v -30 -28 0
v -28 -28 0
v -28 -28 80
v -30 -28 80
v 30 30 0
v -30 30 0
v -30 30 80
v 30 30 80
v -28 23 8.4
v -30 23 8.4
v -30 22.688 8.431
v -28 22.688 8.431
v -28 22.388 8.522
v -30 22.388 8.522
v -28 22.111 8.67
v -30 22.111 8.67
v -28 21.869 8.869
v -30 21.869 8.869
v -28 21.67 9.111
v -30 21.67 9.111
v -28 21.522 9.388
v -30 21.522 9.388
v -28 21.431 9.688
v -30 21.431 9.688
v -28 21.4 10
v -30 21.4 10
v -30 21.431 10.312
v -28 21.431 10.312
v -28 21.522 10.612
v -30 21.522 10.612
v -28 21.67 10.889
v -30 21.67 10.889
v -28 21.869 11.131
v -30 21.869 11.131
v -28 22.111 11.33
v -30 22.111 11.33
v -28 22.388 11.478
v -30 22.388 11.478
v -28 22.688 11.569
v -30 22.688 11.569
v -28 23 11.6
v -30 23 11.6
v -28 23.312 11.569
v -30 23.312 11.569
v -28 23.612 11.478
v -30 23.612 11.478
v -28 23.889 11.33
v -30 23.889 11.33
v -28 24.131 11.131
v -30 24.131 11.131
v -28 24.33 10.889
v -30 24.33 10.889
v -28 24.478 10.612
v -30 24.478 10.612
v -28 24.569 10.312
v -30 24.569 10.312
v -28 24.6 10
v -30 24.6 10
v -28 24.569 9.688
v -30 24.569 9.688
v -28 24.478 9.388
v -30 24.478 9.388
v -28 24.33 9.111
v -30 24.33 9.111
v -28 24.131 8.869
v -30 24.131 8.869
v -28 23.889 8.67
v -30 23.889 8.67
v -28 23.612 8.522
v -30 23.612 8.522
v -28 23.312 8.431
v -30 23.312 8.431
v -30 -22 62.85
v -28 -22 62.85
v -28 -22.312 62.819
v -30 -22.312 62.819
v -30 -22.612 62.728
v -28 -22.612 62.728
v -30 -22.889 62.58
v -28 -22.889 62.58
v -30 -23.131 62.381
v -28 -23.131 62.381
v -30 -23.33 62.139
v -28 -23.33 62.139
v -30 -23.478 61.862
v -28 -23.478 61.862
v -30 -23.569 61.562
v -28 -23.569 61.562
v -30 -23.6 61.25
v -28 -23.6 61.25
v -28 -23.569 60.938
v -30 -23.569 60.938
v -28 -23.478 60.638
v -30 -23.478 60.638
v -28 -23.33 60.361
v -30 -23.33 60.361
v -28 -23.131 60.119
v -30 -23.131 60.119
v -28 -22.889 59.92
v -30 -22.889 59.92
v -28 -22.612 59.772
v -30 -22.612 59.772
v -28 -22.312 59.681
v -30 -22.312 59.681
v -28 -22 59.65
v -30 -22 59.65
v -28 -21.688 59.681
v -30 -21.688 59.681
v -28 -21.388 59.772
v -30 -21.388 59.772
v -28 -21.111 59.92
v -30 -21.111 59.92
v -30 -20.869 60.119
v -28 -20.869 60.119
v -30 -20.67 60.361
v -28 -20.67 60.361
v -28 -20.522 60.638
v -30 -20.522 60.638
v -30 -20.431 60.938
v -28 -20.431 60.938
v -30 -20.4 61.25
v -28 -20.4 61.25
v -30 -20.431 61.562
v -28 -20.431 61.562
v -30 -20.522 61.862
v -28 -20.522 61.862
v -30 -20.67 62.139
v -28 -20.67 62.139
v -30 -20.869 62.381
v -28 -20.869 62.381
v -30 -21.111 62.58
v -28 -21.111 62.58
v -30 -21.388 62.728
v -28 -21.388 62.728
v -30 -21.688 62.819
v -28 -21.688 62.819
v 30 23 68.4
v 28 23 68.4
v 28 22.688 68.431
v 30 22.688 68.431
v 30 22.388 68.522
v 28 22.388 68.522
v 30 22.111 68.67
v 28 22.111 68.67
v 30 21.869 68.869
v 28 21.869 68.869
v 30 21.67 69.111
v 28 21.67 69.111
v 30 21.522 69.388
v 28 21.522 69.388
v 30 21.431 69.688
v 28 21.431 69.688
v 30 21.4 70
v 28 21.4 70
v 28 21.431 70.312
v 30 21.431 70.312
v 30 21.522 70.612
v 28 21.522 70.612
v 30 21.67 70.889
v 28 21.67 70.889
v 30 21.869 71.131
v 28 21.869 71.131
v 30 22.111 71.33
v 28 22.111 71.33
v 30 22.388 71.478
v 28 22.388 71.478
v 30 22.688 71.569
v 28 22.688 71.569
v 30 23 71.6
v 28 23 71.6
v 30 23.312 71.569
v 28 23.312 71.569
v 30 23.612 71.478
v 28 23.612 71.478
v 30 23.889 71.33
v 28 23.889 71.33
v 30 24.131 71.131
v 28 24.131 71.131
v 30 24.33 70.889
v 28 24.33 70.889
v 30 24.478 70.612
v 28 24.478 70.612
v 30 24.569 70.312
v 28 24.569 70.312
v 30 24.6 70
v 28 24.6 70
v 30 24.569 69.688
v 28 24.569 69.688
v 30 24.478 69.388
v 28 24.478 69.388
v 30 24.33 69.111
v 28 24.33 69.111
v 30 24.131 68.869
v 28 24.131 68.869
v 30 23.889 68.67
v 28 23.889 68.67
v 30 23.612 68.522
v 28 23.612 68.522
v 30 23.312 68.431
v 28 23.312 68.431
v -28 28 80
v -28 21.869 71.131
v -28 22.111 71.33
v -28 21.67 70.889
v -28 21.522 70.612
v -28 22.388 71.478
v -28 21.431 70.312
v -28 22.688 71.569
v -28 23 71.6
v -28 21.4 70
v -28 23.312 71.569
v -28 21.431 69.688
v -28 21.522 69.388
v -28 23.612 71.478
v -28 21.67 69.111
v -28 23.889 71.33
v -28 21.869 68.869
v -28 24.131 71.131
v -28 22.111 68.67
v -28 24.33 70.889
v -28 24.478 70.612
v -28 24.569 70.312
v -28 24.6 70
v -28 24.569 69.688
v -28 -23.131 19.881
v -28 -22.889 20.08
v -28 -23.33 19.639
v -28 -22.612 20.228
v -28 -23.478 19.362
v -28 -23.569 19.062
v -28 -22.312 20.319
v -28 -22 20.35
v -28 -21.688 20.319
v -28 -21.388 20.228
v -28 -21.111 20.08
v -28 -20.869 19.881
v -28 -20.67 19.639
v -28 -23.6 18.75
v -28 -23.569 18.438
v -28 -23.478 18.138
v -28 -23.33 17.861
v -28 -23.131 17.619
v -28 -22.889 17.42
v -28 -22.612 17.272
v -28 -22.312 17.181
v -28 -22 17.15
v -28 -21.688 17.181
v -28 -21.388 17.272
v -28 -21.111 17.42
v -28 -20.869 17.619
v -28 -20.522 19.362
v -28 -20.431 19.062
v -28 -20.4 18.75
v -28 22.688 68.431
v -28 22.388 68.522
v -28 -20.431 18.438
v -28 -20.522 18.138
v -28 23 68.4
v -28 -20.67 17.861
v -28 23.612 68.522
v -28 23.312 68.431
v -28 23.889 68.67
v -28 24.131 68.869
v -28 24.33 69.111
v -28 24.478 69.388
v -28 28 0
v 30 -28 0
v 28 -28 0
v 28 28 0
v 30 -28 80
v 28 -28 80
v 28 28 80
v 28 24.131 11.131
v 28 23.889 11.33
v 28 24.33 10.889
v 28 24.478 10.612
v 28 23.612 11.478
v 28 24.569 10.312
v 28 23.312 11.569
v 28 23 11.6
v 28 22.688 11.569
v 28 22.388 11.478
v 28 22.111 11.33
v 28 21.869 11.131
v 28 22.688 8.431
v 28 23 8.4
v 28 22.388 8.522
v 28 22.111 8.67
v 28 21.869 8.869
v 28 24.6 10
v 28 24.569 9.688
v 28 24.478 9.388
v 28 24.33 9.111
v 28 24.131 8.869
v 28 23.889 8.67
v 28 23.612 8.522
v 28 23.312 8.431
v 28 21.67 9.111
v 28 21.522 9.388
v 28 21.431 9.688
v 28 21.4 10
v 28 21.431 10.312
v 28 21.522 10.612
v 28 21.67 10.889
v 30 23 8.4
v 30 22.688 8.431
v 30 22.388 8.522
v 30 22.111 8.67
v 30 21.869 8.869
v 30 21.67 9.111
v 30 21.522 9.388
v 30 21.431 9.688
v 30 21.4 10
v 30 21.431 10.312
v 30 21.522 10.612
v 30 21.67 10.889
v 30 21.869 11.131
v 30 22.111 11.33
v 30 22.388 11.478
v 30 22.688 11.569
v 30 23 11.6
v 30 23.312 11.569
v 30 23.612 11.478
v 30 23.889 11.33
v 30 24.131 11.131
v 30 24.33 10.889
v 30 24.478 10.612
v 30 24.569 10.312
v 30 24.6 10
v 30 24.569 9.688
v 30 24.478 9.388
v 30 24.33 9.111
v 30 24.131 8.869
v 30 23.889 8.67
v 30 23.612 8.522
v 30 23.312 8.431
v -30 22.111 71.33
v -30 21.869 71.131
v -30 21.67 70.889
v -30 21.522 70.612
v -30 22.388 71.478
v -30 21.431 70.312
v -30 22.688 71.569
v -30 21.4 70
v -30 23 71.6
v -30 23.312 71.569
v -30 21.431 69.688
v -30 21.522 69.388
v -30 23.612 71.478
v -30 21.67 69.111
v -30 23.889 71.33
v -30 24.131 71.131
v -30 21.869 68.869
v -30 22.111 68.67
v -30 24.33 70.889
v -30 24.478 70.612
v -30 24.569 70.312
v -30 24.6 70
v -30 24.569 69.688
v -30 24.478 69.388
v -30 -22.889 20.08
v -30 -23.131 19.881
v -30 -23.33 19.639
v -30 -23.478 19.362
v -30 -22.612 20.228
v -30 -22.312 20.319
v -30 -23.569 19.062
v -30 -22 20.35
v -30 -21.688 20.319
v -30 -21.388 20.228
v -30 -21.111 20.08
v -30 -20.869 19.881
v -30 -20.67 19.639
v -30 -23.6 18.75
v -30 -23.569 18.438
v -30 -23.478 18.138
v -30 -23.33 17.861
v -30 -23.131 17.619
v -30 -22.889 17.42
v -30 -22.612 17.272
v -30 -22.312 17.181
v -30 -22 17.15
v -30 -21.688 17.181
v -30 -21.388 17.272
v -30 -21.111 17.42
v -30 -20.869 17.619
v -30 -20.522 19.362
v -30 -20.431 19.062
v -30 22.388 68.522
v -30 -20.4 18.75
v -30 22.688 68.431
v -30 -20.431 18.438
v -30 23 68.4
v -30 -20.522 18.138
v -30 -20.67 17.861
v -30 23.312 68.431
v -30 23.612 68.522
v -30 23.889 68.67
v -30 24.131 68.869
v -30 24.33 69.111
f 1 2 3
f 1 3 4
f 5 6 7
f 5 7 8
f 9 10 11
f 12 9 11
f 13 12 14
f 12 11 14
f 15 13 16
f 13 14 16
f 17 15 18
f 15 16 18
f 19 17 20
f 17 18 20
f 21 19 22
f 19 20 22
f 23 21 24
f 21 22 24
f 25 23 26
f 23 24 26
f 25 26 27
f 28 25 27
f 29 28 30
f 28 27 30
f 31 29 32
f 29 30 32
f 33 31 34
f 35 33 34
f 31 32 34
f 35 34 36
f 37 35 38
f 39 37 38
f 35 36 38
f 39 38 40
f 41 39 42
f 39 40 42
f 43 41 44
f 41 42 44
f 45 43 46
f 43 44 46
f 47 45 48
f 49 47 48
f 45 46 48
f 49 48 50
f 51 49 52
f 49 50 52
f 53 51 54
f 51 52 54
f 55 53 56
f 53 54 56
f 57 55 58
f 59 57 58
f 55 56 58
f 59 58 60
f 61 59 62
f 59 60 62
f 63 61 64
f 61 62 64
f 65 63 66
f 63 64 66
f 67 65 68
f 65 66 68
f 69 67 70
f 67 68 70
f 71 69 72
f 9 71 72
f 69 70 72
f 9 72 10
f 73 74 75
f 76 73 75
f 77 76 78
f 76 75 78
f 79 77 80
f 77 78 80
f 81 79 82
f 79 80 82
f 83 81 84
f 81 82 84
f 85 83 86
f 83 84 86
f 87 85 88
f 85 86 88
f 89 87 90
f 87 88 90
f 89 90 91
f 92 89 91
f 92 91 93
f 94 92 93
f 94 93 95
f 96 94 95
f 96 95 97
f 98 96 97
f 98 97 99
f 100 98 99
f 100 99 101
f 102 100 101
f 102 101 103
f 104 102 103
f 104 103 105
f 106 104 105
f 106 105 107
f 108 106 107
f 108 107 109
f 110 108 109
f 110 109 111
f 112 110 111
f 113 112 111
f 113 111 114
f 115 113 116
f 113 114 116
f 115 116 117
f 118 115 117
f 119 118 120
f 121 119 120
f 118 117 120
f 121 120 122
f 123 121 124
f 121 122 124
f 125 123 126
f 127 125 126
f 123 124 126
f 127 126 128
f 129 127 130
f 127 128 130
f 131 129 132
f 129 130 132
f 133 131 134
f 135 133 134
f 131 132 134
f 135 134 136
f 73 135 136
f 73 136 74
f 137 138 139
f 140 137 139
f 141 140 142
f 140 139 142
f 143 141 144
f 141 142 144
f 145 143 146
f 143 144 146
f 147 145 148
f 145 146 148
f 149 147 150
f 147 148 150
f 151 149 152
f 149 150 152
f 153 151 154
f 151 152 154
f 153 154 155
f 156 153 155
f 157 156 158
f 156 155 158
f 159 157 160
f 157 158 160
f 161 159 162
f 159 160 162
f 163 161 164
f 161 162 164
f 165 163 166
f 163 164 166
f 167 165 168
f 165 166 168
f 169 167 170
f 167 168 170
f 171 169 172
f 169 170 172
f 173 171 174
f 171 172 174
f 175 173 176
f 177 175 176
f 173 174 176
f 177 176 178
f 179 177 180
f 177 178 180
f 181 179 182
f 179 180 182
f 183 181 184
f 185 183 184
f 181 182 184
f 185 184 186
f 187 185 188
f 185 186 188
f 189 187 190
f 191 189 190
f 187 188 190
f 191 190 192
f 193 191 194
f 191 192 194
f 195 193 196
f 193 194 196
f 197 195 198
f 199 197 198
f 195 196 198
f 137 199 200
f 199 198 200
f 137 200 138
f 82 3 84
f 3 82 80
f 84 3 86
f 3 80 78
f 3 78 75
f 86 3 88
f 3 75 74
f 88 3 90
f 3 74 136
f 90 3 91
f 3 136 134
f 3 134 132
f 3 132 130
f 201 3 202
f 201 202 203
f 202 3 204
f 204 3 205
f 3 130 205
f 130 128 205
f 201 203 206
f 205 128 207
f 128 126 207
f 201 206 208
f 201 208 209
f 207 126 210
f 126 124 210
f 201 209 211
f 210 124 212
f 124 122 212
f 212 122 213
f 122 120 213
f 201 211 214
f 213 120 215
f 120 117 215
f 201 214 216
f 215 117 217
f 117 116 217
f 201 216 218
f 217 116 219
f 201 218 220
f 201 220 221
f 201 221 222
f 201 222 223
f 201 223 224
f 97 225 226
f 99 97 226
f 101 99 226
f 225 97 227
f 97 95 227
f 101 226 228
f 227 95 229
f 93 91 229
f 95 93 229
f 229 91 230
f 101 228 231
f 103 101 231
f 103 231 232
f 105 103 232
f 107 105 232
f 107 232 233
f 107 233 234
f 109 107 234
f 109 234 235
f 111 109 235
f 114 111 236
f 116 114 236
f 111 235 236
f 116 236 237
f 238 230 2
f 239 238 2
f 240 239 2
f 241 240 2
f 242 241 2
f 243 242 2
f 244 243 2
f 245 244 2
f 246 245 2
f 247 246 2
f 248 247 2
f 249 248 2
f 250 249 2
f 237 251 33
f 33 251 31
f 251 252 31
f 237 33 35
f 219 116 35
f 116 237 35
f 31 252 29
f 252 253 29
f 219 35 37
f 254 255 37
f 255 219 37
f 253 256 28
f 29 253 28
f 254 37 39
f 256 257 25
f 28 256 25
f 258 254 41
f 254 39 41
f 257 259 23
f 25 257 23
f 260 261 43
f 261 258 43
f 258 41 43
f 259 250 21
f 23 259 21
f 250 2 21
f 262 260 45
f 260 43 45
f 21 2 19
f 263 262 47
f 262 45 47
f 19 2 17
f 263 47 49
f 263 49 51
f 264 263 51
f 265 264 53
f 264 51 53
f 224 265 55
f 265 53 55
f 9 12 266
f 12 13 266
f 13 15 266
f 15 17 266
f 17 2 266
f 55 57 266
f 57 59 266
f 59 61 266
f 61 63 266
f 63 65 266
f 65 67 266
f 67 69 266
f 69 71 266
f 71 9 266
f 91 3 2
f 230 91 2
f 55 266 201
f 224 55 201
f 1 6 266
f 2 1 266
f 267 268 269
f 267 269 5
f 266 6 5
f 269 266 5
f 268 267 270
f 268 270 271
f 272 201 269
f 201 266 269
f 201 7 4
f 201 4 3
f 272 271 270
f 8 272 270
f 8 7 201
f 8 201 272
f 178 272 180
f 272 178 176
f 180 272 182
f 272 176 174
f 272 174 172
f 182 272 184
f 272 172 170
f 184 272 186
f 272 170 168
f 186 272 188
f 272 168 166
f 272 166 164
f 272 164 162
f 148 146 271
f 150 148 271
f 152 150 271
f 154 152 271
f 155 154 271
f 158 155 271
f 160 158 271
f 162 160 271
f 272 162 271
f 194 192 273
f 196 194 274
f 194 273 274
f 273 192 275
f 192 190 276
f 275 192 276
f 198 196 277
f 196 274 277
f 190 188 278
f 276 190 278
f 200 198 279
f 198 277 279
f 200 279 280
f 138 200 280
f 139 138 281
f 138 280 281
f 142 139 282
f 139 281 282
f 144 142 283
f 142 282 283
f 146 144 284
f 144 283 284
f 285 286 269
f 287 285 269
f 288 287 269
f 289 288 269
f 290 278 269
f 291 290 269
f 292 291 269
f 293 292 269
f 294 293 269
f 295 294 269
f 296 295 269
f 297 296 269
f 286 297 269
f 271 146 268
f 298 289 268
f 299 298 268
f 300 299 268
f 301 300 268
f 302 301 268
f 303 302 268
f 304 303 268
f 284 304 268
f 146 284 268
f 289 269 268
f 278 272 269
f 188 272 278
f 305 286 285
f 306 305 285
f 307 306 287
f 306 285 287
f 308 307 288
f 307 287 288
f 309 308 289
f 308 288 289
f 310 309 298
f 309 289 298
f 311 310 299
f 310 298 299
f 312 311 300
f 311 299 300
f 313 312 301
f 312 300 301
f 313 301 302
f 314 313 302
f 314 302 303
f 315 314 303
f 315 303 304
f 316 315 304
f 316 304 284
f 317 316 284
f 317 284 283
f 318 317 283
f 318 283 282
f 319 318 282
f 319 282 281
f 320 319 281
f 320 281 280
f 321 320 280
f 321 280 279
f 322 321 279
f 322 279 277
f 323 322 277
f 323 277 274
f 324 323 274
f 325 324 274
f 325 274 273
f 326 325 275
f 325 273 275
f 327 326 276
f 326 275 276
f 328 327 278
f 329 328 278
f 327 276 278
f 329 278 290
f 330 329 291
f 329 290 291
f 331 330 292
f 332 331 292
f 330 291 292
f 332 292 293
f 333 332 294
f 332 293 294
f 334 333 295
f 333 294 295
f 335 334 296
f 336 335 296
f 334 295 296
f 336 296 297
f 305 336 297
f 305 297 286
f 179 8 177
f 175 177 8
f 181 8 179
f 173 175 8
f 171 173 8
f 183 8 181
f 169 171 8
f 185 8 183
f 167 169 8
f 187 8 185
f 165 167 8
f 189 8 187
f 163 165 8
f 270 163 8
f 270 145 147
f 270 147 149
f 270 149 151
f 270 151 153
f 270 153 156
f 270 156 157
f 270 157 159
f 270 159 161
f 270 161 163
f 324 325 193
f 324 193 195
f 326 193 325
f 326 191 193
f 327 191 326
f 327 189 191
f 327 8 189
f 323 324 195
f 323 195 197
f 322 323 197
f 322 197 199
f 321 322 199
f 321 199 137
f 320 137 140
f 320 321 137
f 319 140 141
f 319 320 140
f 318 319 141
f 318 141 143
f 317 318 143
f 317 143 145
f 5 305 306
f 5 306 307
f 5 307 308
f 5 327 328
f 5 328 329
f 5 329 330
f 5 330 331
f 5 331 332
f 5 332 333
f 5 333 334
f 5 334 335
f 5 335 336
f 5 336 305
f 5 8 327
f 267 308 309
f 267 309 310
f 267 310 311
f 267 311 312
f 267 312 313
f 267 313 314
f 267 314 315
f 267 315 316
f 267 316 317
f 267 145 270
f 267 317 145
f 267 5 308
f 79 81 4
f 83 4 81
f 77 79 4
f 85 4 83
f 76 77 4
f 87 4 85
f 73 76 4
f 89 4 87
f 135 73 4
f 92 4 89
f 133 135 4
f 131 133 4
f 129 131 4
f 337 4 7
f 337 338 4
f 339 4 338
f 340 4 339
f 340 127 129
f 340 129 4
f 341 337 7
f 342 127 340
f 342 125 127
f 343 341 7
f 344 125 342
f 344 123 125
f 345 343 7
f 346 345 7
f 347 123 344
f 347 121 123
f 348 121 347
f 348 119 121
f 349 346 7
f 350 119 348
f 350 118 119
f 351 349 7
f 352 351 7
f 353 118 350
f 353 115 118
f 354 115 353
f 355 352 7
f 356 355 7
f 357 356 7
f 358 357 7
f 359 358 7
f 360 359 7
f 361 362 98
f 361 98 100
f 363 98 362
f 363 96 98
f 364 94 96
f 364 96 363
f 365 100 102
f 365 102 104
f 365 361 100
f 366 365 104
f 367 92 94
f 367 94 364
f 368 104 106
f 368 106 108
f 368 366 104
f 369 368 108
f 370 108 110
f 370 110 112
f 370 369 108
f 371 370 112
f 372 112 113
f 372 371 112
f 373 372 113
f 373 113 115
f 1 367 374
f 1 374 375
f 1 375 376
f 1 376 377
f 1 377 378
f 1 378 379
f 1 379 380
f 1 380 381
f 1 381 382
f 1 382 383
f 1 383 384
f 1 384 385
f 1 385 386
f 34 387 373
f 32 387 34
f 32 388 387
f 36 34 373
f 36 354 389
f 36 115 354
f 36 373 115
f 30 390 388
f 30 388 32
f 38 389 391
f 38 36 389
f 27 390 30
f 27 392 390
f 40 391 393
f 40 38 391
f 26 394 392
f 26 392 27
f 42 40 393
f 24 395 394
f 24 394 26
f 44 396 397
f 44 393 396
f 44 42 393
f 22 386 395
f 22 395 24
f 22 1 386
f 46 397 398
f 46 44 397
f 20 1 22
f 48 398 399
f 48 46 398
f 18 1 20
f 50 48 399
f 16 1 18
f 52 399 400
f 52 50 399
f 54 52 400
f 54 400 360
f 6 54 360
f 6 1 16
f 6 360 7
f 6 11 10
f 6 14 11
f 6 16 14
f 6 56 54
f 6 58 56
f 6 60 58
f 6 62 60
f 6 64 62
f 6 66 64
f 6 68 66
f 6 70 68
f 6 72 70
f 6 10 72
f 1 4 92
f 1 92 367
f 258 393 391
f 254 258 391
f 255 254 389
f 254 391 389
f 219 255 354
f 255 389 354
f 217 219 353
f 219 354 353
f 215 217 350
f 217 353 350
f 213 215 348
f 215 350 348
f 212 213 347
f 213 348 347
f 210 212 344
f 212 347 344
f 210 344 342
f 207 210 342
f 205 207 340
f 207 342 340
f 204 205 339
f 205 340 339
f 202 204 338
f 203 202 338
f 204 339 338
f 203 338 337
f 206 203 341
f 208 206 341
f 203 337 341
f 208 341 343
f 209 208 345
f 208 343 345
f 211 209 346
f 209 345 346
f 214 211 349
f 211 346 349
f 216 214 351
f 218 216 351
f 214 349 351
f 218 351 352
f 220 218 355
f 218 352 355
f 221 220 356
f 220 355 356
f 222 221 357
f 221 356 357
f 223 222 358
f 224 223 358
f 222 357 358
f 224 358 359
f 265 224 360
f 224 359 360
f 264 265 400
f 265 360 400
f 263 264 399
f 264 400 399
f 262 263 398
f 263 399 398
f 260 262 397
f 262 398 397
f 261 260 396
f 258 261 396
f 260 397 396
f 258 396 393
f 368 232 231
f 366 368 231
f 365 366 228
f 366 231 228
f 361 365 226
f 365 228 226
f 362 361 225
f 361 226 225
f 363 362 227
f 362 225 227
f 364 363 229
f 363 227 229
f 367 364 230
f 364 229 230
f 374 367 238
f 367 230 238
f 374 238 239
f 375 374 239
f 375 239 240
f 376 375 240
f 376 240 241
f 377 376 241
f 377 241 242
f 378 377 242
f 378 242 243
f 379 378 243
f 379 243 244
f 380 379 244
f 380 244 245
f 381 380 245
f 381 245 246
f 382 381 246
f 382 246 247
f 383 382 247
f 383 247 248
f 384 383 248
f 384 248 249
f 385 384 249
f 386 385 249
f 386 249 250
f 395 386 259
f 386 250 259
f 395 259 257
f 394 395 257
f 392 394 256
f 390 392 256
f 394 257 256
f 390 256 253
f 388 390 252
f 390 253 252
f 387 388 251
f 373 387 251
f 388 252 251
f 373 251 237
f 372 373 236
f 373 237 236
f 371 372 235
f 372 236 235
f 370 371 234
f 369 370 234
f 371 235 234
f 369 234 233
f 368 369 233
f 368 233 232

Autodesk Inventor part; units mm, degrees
ref_plane "YZ Plane" through (0, 0, 0) normal (1, 0, 0) x (0, 1, 0)
ref_plane "XZ Plane" through (0, 0, 0) normal (0, 1, 0) x (-1, 0, 0)
ref_plane "XY Plane" through (0, 0, 0) normal (0, 0, 1) x (1, 0, 0)
sketch "スケッチ1" plane through (0, 0, 0) normal (0, 0, 1) x (1, 0, 0)
  line L0 (-30, 30) -> (30, 30)
  line L1 (30, 30) -> (30, -30)
  line L2 (30, -30) -> (-30, -30)
  line L3 (-30, -30) -> (-30, 30)
  line L4 (-30, 30) -> (30, -30) construction
  line L5 (30, 30) -> (-30, -30) construction
  line L6 (-28, 28) -> (28, 28)
  line L7 (28, 28) -> (28, -28)
  line L8 (28, -28) -> (-28, -28)
  line L9 (-28, -28) -> (-28, 28)
  line L10 (-28, 28) -> (28, -28) construction
  line L11 (28, 28) -> (-28, -28) construction
  point P0 (0, 0)
  dimension "d0" = 60
  dimension "d1" = 60
  dimension "d2" = 56
  dimension "d3" = 56
extrude "押し出し1" add sketch "スケッチ1" along normal blind 80
sketch "スケッチ2" plane through (0, 0, 80) normal (0, 0, 1) x (1, 0, 0)
  line L0 (30, 30) -> (30, -30) projected
  line L1 (-30, -30) -> (30, -30)
  line L2 (30, -30) -> (30, -28)
  line L3 (30, -28) -> (-30, -28)
  line L4 (-30, -28) -> (-30, -30)
  point P0 (0, 0)
  dimension "d6" = 2
extrude "押し出し2" cut sketch "スケッチ2" against normal blind 100
sketch "スケッチ3" plane through (30, 30, 80) normal (1, 0, 0) x (0, 0, -1)
  line L0 (0, -58) -> (0, 0) projected
  line L1 (80, 0) -> (80, -58) projected
  line L2 (80, 0) -> (0, 0) projected
  point P0 (80, -30)
  point P1 (10, -7)
  point P2 (70, -7)
  dimension "d9" = 60
  dimension "d10" = 10
  dimension "d11" = 10
  dimension "d12" = 7
  dimension "d13" = 7
hole "穴1" at (30, 23, 70) at (30, 23, 10) direction (-1, 0, 0) diameter 3.2 end through all
sketch "スケッチ4" plane through (-30, 30, 0) normal (-1, 0, 0) x (0, 0, 1)
  line L0 (0, 0) -> (80, 0) projected
  line L1 (80, 0) -> (80, -58) projected
  point P0 (0, -30)
  point P1 (61.25, -52)
  point P2 (18.75, -52)
  dimension "d21" = 52
  dimension "d22" = 42.5
  dimension "d23" = 18.75
hole "穴2" at (-30, -22, 61.25) at (-30, -22, 18.75) direction (1, 0, 0) diameter 3.2 depth 8 tip angle 118
properties part number "Square pillar" material "アルミニウム 6061"
